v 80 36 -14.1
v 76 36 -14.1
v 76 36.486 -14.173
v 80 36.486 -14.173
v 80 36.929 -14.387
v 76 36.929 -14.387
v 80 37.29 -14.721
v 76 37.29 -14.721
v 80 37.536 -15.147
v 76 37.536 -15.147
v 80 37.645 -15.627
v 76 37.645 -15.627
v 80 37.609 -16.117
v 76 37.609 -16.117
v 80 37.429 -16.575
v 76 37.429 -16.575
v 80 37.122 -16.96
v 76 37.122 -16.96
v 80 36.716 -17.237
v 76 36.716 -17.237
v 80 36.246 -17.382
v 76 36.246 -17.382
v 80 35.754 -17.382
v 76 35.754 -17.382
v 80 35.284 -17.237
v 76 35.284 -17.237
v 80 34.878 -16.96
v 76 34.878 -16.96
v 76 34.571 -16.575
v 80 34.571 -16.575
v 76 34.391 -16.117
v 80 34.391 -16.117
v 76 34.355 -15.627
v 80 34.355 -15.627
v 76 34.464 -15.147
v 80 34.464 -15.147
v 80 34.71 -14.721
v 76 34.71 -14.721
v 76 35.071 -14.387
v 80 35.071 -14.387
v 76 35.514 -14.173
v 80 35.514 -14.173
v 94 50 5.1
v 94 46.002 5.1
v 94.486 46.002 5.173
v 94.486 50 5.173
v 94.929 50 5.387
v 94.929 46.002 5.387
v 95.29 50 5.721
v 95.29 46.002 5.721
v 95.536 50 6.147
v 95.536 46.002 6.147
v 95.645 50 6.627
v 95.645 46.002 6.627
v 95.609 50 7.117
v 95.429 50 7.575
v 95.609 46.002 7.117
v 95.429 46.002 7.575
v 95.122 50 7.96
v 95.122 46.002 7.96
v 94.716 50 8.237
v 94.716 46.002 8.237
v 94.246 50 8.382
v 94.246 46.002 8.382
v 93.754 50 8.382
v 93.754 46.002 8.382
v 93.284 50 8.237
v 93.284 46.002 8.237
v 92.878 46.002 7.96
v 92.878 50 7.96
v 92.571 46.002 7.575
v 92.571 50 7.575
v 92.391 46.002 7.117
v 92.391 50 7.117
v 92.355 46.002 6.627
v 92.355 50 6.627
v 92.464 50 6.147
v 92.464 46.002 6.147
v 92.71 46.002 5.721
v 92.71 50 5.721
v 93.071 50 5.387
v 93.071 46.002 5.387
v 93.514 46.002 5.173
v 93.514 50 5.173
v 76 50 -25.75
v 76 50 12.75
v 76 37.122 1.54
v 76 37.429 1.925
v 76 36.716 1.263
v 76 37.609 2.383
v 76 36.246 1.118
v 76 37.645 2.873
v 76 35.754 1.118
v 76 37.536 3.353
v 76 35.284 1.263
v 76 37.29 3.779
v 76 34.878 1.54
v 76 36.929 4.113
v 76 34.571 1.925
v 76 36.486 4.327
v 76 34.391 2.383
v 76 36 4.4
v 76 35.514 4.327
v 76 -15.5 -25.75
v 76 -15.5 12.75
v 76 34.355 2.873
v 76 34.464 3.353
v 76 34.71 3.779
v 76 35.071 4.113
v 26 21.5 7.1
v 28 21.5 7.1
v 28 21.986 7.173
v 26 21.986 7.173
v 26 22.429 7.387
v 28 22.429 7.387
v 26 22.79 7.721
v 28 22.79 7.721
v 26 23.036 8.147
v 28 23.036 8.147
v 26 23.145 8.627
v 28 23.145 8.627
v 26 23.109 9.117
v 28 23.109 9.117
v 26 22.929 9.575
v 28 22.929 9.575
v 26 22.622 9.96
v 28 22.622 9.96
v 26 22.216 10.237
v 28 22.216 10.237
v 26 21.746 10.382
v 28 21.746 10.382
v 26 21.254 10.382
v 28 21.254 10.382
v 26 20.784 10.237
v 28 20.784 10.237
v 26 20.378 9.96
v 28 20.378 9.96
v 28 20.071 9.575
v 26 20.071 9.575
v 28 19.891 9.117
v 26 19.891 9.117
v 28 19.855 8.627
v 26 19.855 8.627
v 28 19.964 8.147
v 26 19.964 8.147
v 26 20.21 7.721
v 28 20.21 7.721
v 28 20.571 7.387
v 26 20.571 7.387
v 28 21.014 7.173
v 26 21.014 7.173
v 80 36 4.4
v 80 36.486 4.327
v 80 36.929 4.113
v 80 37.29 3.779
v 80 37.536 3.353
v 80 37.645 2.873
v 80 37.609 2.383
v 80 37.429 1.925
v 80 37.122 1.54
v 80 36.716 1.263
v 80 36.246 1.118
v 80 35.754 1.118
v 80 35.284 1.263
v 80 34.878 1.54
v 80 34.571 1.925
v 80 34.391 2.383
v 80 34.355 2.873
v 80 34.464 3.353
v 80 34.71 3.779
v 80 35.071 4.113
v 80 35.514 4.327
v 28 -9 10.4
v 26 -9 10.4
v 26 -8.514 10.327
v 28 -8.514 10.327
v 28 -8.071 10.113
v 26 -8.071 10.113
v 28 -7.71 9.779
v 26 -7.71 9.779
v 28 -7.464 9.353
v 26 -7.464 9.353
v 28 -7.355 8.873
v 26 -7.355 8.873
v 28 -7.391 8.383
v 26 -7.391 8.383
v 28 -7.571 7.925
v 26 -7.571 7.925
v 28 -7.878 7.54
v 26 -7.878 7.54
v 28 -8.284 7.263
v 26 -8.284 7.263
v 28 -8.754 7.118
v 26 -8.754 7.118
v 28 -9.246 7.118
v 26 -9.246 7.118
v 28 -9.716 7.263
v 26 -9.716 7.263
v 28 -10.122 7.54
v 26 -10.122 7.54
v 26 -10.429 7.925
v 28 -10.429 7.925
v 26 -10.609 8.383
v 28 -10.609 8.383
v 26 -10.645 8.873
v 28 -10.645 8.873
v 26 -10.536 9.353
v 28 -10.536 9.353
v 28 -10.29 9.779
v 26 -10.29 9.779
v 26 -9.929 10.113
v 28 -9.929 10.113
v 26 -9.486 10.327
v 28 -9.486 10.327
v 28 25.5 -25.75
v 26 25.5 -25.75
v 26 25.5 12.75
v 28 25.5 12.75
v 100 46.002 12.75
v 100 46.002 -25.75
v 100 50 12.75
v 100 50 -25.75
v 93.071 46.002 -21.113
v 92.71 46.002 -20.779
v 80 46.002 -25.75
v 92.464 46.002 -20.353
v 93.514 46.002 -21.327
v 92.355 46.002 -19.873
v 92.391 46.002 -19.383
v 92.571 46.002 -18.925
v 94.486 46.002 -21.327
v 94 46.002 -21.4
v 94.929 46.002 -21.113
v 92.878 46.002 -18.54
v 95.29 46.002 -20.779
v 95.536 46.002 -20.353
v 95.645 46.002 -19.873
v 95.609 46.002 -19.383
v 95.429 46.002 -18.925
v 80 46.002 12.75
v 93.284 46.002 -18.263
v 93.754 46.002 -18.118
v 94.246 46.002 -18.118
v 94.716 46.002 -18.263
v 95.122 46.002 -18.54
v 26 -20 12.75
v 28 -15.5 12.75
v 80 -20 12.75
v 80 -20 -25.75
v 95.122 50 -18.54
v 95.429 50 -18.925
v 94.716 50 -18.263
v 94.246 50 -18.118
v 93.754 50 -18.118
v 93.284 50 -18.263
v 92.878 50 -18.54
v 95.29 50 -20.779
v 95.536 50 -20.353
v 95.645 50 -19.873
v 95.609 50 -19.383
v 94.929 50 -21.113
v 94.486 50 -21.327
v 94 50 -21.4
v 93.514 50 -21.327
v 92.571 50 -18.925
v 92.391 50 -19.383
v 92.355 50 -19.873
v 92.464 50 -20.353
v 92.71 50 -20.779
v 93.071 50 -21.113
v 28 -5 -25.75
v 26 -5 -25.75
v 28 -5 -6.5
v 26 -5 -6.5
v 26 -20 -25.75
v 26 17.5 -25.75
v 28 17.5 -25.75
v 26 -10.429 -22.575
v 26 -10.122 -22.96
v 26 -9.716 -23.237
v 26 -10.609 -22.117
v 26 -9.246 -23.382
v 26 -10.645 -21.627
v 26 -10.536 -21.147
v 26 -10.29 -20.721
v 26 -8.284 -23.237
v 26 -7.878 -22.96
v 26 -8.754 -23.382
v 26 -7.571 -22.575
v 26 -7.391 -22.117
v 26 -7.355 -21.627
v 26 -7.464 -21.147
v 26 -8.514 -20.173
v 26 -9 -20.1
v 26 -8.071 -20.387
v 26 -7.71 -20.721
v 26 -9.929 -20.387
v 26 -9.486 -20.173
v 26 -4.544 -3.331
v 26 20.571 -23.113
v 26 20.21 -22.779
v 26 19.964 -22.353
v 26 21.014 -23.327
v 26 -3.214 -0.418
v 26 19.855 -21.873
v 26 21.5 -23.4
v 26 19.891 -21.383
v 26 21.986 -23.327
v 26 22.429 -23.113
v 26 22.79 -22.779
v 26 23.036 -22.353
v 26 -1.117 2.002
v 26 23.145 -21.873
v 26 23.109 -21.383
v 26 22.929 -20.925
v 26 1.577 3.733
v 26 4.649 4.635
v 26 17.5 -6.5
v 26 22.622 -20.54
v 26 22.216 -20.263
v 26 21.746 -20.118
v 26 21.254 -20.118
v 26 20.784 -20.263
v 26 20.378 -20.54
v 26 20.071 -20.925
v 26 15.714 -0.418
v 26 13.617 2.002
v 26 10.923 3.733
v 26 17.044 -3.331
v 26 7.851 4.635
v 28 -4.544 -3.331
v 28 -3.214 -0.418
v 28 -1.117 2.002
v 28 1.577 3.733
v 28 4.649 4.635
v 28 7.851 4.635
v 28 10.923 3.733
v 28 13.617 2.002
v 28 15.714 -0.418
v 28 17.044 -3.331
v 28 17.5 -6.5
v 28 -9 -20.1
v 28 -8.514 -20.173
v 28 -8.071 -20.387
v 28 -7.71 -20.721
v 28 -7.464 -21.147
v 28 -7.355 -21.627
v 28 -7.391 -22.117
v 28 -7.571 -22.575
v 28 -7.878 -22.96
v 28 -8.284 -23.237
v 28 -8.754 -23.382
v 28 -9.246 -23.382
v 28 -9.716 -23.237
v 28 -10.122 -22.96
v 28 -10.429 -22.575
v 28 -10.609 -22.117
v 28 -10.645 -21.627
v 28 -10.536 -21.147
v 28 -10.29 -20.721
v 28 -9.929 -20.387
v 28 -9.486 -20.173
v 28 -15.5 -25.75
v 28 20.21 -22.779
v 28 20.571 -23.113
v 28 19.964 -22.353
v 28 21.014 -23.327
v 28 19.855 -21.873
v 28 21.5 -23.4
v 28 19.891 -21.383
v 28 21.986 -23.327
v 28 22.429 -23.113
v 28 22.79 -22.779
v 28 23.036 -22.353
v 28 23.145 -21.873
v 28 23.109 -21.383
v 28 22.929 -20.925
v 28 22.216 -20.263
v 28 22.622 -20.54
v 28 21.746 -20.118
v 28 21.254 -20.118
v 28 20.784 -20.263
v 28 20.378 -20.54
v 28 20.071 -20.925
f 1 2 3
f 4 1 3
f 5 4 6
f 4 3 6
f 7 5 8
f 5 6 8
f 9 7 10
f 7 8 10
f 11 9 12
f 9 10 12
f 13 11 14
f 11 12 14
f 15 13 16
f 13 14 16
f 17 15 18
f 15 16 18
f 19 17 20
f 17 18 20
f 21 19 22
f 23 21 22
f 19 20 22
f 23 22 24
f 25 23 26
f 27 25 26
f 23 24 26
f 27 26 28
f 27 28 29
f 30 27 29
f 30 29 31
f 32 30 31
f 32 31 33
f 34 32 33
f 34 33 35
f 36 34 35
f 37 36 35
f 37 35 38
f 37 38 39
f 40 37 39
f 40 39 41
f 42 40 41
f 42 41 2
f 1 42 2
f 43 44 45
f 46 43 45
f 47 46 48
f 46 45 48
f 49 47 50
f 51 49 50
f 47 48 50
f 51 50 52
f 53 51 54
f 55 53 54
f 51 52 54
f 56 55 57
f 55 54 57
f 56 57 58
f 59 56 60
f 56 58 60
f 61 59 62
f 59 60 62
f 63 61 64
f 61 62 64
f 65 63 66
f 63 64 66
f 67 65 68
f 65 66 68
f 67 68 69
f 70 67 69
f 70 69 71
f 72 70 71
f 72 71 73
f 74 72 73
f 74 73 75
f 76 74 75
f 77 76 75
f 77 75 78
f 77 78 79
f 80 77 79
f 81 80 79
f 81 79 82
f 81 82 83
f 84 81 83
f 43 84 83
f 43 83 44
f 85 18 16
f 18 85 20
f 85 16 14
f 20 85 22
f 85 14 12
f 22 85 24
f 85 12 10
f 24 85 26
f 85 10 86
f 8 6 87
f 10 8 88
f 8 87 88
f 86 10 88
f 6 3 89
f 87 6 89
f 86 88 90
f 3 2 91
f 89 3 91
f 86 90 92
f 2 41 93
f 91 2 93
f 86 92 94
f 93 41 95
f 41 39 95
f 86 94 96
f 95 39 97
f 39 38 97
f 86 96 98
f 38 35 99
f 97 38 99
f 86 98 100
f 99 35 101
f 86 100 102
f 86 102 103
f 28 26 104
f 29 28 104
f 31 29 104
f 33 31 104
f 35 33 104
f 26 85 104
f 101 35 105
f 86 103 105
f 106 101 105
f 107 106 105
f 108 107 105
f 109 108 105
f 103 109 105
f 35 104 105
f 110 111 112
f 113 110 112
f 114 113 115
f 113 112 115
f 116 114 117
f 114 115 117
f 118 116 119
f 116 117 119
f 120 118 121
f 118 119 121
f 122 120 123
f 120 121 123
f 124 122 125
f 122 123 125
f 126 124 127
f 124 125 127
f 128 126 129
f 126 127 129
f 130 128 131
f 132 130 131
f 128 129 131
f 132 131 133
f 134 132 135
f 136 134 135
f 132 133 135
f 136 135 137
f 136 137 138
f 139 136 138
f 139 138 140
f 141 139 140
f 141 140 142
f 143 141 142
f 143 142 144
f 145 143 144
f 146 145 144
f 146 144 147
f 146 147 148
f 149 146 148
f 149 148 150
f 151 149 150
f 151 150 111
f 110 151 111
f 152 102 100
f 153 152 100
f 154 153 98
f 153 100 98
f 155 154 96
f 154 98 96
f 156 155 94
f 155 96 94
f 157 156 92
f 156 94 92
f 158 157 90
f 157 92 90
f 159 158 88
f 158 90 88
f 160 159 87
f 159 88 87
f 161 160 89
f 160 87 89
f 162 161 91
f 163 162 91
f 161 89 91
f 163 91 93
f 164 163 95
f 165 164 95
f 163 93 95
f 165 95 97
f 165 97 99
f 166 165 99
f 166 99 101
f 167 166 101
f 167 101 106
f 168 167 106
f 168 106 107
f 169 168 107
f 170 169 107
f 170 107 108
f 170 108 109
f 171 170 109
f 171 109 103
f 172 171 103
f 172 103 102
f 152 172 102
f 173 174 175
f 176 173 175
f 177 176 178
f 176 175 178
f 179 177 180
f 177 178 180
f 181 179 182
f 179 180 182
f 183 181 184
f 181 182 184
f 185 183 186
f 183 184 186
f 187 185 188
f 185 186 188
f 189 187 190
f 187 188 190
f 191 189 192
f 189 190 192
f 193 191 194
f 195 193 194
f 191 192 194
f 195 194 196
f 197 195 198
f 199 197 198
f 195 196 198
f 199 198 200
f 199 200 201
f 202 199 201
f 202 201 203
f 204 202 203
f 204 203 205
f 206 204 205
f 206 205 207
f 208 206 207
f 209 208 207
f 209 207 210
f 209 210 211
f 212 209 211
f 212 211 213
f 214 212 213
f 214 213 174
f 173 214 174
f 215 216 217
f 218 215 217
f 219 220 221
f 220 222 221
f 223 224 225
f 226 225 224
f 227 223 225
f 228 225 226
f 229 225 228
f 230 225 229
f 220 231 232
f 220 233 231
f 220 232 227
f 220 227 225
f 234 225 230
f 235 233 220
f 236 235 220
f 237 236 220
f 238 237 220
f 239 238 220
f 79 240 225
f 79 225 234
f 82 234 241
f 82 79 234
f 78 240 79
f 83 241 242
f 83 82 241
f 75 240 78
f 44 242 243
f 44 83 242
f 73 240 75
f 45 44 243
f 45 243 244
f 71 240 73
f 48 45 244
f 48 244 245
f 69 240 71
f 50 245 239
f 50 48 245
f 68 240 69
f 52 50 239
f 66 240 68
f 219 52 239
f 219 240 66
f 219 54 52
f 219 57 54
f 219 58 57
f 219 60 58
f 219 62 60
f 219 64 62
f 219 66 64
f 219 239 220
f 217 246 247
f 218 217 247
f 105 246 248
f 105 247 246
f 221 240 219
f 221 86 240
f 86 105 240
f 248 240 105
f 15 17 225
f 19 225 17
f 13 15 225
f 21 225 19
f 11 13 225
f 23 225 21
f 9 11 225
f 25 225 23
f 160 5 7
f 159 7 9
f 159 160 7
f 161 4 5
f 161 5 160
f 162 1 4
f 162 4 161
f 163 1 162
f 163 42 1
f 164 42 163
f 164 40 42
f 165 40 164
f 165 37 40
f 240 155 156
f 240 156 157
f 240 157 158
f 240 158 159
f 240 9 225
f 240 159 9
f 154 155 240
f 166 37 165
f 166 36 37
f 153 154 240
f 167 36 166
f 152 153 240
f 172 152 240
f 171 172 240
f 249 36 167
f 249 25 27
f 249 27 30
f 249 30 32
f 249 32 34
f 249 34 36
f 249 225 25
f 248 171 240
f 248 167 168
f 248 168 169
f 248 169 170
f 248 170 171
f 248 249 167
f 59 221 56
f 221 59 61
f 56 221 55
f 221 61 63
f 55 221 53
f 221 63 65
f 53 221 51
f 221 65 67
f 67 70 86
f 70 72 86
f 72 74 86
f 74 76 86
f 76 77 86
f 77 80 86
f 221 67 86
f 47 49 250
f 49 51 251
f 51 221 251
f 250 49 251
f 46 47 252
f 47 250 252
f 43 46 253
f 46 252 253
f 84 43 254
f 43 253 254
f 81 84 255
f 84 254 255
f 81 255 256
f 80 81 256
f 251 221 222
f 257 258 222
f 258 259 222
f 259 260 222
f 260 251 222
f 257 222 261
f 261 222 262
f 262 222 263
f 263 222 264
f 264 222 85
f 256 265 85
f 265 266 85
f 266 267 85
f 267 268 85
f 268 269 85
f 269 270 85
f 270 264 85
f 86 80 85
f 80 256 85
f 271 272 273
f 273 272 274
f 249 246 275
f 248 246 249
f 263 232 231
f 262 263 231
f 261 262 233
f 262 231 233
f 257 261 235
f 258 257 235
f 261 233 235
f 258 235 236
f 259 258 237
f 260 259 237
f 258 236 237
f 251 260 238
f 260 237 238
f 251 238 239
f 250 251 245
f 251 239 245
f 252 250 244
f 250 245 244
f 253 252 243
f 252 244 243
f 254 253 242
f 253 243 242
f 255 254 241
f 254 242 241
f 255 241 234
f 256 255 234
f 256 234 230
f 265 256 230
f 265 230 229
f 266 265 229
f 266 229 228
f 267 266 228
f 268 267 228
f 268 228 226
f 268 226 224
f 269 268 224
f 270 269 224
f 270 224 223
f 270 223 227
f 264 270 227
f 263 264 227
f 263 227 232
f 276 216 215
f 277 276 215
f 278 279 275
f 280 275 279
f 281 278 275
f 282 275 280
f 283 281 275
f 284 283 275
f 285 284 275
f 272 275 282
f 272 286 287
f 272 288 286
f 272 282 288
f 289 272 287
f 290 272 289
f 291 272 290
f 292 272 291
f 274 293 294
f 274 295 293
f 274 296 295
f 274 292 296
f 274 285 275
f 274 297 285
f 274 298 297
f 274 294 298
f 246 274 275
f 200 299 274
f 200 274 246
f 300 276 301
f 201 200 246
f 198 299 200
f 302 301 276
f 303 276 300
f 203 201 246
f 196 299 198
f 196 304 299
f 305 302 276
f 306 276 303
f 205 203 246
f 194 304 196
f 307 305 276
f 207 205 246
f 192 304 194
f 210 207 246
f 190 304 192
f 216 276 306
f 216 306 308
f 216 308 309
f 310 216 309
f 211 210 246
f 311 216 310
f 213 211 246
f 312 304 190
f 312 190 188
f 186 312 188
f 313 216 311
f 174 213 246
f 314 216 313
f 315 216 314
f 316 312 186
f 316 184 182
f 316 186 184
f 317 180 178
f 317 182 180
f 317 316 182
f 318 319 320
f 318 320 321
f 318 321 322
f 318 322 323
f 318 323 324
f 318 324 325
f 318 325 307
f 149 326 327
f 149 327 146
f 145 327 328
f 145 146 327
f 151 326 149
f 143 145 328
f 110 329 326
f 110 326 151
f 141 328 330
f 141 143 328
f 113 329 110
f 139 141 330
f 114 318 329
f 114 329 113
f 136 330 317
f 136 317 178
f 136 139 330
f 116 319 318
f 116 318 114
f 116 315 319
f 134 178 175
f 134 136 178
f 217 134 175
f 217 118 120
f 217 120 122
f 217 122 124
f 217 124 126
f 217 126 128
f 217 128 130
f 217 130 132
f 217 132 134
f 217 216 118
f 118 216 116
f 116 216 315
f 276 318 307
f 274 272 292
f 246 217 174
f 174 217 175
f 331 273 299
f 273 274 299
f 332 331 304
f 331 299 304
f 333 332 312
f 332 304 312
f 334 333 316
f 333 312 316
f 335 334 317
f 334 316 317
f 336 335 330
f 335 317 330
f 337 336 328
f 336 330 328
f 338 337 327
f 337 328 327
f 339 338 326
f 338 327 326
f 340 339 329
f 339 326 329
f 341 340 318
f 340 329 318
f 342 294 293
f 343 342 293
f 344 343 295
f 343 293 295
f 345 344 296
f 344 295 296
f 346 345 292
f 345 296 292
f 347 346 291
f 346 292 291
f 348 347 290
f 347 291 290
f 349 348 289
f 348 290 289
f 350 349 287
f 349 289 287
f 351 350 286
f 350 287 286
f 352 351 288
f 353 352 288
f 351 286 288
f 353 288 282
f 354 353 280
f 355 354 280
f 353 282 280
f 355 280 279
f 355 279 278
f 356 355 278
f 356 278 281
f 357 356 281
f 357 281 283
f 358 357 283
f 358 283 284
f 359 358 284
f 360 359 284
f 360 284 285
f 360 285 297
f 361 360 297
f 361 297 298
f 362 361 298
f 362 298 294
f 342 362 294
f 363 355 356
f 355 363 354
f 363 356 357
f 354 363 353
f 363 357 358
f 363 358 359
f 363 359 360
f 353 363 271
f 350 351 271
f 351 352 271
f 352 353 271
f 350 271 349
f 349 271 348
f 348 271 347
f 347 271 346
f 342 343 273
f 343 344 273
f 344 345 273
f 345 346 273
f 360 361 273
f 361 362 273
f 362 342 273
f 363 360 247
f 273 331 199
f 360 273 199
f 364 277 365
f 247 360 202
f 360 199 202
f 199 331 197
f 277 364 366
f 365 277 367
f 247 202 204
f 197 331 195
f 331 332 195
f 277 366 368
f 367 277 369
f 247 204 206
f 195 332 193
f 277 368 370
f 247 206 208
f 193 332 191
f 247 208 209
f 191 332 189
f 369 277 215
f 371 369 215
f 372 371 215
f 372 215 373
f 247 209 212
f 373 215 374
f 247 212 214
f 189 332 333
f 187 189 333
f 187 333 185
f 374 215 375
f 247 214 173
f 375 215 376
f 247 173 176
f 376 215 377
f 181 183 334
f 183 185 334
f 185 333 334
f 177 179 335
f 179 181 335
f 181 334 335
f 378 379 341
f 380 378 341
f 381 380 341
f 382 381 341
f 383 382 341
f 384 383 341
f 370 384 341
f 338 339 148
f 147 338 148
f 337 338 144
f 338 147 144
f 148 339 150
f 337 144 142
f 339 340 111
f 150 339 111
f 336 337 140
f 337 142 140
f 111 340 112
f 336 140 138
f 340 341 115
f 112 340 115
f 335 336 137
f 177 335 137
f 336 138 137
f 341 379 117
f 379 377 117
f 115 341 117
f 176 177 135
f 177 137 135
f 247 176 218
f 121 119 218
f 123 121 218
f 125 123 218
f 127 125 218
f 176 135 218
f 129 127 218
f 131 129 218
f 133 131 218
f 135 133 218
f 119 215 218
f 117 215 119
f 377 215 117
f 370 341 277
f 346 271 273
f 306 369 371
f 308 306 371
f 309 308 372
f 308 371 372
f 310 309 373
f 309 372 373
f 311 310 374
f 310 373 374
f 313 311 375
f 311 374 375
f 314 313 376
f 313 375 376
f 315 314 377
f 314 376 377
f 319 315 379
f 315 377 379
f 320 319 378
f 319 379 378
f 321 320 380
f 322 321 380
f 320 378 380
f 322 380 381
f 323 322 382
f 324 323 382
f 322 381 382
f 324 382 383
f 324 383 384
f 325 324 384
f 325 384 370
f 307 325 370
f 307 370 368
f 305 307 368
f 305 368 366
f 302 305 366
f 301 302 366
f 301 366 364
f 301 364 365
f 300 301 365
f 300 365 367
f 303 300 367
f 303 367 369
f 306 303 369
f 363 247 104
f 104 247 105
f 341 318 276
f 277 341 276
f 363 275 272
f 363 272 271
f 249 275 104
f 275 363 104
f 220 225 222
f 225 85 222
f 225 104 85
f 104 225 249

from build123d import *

# Parameters (mm, degrees)
SKETCH1_W                 = 13
SKETCH1_H                 = 16
BOSS_EXTRUDE1_DEPTH       = 4
SKETCH2_R                 = 1.65
CUT_EXTRUDE1_DEPTH        = 10
SKETCH3_W                 = 4
SKETCH3_H                 = 13
BOSS_EXTRUDE2_DEPTH       = 4
SKETCH4_W                 = 13
SKETCH4_H                 = 4
BOSS_EXTRUDE3_DEPTH       = 60
SKETCH6_W                 = 4
SKETCH6_H                 = 21
SKETCH6_H_2               = 13
BOSS_EXTRUDE4_DEPTH       = 28
SKETCH12_W                = 4
SKETCH12_H                = 28
BOSS_EXTRUDE8_DEPTH       = 1.65
SKETCH13_W                = 4
SKETCH13_H                = 28
BOSS_EXTRUDE9_DEPTH       = 1.65
SKETCH14_W                = 4
SKETCH14_H                = 35.878399396
CUT_EXTRUDE5_DEPTH        = 24
SKETCH15_R                = 1.65
CUT_EXTRUDE6_DEPTH        = 24
SKETCH16_W                = 4
SKETCH16_H                = 11.121600604
SKETCH16_H_2              = 11.3
BOSS_EXTRUDE10_DEPTH      = 29.15
SKETCH17_R                = 1.65
CUT_EXTRUDE8_DEPTH        = 29.15
SKETCH18_W                = 22.65
SKETCH18_H                = 4
SKETCH18_W_2              = 13
BOSS_EXTRUDE11_DEPTH      = 4
SKETCH19_W                = 4
SKETCH19_H                = 20
BOSS_EXTRUDE12_DEPTH      = 40
SKETCH20_R                = 1.65
CUT_EXTRUDE9_DEPTH        = 40
SKETCH21_W                = 4
SKETCH21_H                = 30.5
BOSS_EXTRUDE13_DEPTH      = 38.5
SKETCH23_W                = 4
SKETCH23_H                = 4
BOSS_EXTRUDE14_DEPTH      = 38.5
SKETCH24_W                = 4
SKETCH24_H                = 38.5
BOSS_EXTRUDE15_DEPTH      = 3
SKETCH27_W                = 4
SKETCH27_H                = 58.3
CUT_EXTRUDE10_DEPTH       = 100
BOSS_EXTRUDE16_DEPTH      = 40
BOSS_EXTRUDE16_DEPTH_BACK = 28
SKETCH29_W                = 38.5
SKETCH29_H                = 7
SKETCH30_R                = 1.65
CUT_EXTRUDE11_DEPTH       = 40
SKETCH31_W                = 4
SKETCH31_H                = 22.5
CUT_EXTRUDE12_DEPTH       = 38.5
SKETCH32_W                = 38.5
SKETCH32_H                = 2.5
CUT_EXTRUDE13_DEPTH       = 40
SKETCH33_W                = 4
SKETCH33_H                = 8
BOSS_EXTRUDE17_DEPTH      = 8
SKETCH34_R                = 1.65
CUT_EXTRUDE14_DEPTH       = 8
SKETCH35_W                = 4
SKETCH35_H                = 43.5
BOSS_EXTRUDE18_DEPTH      = 13
CUT_EXTRUDE15_START       = -20
SKETCH36_W                = 10
SKETCH36_H                = 80
CUT_EXTRUDE15_DEPTH       = 20
SKETCH37_W                = 5
SKETCH37_H                = 7
BOSS_EXTRUDE19_DEPTH      = 4
SKETCH41_W                = 13
SKETCH41_H                = 20
BOSS_EXTRUDE20_DEPTH      = 4
SKETCH42_R                = 1.65
CUT_EXTRUDE18_DEPTH       = 4
SKETCH43_W                = 4
SKETCH43_H                = 38.5
CUT_EXTRUDE19_DEPTH       = 10
SKETCH44_W                = 8
SKETCH44_H                = 9
BOSS_EXTRUDE21_DEPTH      = 4
SKETCH45_R                = 1.65
CUT_EXTRUDE20_DEPTH       = 4
CUT_EXTRUDE21_DEPTH       = 3
SKETCH49_R                = 1.65
CUT_EXTRUDE22_DEPTH       = 5
SKETCH54_W                = 1
SKETCH54_H                = 38.5
CUT_EXTRUDE24_DEPTH       = 50
SKETCH55_W                = 8
SKETCH55_H                = 10
BOSS_EXTRUDE22_DEPTH      = 4
SKETCH56_R                = 1.65
CUT_EXTRUDE25_DEPTH       = 4
CUT_EXTRUDE26_DEPTH       = 15
CUT_EXTRUDE26_DEPTH_BACK  = 10
SKETCH57_W                = 25
SKETCH57_H                = 70
SKETCH58_W                = 47.5
SKETCH58_H                = 38.5
BOSS_EXTRUDE24_DEPTH      = 4.5
SKETCH59_W                = 0.5
SKETCH59_H                = 38.5
BOSS_EXTRUDE25_DEPTH      = 4.5
SKETCH60_W                = 4
SKETCH60_H                = 38.5
BOSS_EXTRUDE26_DEPTH      = 69.5
SKETCH61_W                = 38.5
SKETCH61_H                = 2.457662878
BOSS_EXTRUDE27_DEPTH      = 20
SKETCH62_W                = 38.5
SKETCH62_H                = 2
BOSS_EXTRUDE31_DEPTH      = 29.5
SKETCH64_W                = 4
SKETCH64_H                = 13
BOSS_EXTRUDE32_DEPTH      = 16
SKETCH65_R                = 1.65
CUT_EXTRUDE27_DEPTH       = 16
SKETCH66_W                = 24
SKETCH66_H                = 0.5
BOSS_EXTRUDE33_DEPTH      = 38.5
SKETCH69_W                = 20
SKETCH69_H                = 38.5
BOSS_EXTRUDE34_DEPTH      = 1.04
SKETCH70_R                = 1.65
CUT_EXTRUDE29_DEPTH       = 10
SKETCH72_W                = 2
SKETCH72_H                = 38.5
CUT_EXTRUDE31_DEPTH       = 60
SKETCH73_W                = 22.5
SKETCH73_H                = 38.5
BOSS_EXTRUDE35_DEPTH      = 2
SKETCH74_R                = 11.25
CUT_EXTRUDE32_DEPTH       = 2
CUT_EXTRUDE33_DEPTH       = 2
SKETCH76_R                = 1.65
CUT_EXTRUDE34_DEPTH       = 5
SKETCH77_W                = 35
SKETCH77_H                = 30
CUT_EXTRUDE35_DEPTH       = 1000


with BuildPart() as part:
    # Sketch1 → Boss-Extrude1 (new body)
    with BuildSketch(Plane(origin=(0, 0, 0), x_dir=(0, 0, -1), z_dir=(1, 0, 0))):
        with Locations((6.5, -8)):
            Rectangle(SKETCH1_W, SKETCH1_H)
    extrude(amount=BOSS_EXTRUDE1_DEPTH)

    # Sketch2 → Cut-Extrude1 (cut)
    with BuildSketch(Plane(origin=(4, 0, 0), x_dir=(0, 0, -1), z_dir=(1, 0, 0))):
        with Locations((6.5, -4)):
            Circle(SKETCH2_R)
        with Locations((6.5, -12)):
            Circle(SKETCH2_R)
    extrude(amount=-CUT_EXTRUDE1_DEPTH, mode=Mode.SUBTRACT)

    # Sketch3 → Boss-Extrude2 (add)
    with BuildSketch(Plane.XZ.offset(16)):
        with Locations((2, -6.5)):
            Rectangle(SKETCH3_W, SKETCH3_H)
    extrude(amount=BOSS_EXTRUDE2_DEPTH)

    # Sketch4 → Boss-Extrude3 (add)
    with BuildSketch(Plane(origin=(4, 0, 0), x_dir=(0, 0, -1), z_dir=(1, 0, 0))):
        with Locations((6.5, -18)):
            Rectangle(SKETCH4_W, SKETCH4_H)
    extrude(amount=BOSS_EXTRUDE3_DEPTH)

    # Sketch6 → Boss-Extrude4 (add)
    with BuildSketch(Plane(origin=(0, -16, 0), x_dir=(1, 0, 0), z_dir=(0, 1, 0))):
        with Locations((62, -10.5)):
            Rectangle(SKETCH6_W, SKETCH6_H)
        with Locations((62, 23.5)):
            Rectangle(SKETCH6_W, SKETCH6_H)
        with Locations((62, 6.5)):
            Rectangle(SKETCH6_W, SKETCH6_H_2)
    extrude(amount=BOSS_EXTRUDE4_DEPTH)

    # Sketch12 → Boss-Extrude8 (add)
    with BuildSketch(Plane(origin=(0, 0, -34), x_dir=(-1, 0, 0), z_dir=(0, 0, -1))):
        with Locations((-62, -2)):
            Rectangle(SKETCH12_W, SKETCH12_H)
    extrude(amount=BOSS_EXTRUDE8_DEPTH)

    # Sketch13 → Boss-Extrude9 (add)
    with BuildSketch(Plane.XY.offset(21)):
        with Locations((62, -2)):
            Rectangle(SKETCH13_W, SKETCH13_H)
    extrude(amount=BOSS_EXTRUDE9_DEPTH)

    # Sketch14 → Cut-Extrude5 (cut)
    with BuildSketch(Plane(origin=(0, 12, 0), x_dir=(1, 0, 0), z_dir=(0, 1, 0))):
        with Locations((62, 6.410800302)):
            Rectangle(SKETCH14_W, SKETCH14_H)
    extrude(amount=-CUT_EXTRUDE5_DEPTH, mode=Mode.SUBTRACT)

    # Sketch15 → Cut-Extrude6 (cut)
    with BuildSketch(Plane(origin=(64, 0, 0), x_dir=(0, 0, -1), z_dir=(1, 0, 0))):
        with Locations((-17, -11.5)):
            Circle(SKETCH15_R)
        with Locations((30, -11.5)):
            Circle(SKETCH15_R)
    extrude(amount=-CUT_EXTRUDE6_DEPTH, mode=Mode.SUBTRACT)

    # Sketch16 → Boss-Extrude10 (add)
    with BuildSketch(Plane(origin=(0, 12, 0), x_dir=(1, 0, 0), z_dir=(0, 1, 0))):
        with Locations((62, -17.089199698)):
            Rectangle(SKETCH16_W, SKETCH16_H)
        with Locations((62, 30)):
            Rectangle(SKETCH16_W, SKETCH16_H_2)
    extrude(amount=BOSS_EXTRUDE10_DEPTH)

    # Sketch17 → Cut-Extrude8 (cut)
    with BuildSketch(Plane(origin=(64, 0, 0), x_dir=(0, 0, -1), z_dir=(1, 0, 0))):
        with Locations((-17, 35.5)):
            Circle(SKETCH17_R)
        with Locations((30, 35.5)):
            Circle(SKETCH17_R)
    extrude(amount=-CUT_EXTRUDE8_DEPTH, mode=Mode.SUBTRACT)

    # Sketch18 → Boss-Extrude11 (add)
    with BuildSketch(Plane(origin=(64, 0, 0), x_dir=(0, 0, -1), z_dir=(1, 0, 0))):
        with Locations((-11.325, -18)):
            Rectangle(SKETCH18_W, SKETCH18_H)
        with Locations((24.325, -18)):
            Rectangle(SKETCH18_W, SKETCH18_H)
        with Locations((6.5, -18)):
            Rectangle(SKETCH18_W_2, SKETCH18_H)
    extrude(amount=-BOSS_EXTRUDE11_DEPTH)

    # Sketch19 → Boss-Extrude12 (add)
    with BuildSketch(Plane(origin=(0, 0, -13), x_dir=(-1, 0, 0), z_dir=(0, 0, -1))):
        with Locations((-2, -10)):
            Rectangle(SKETCH19_W, SKETCH19_H)
    extrude(amount=BOSS_EXTRUDE12_DEPTH)

    # Sketch20 → Cut-Extrude9 (cut)
    with BuildSketch(Plane.ZY):
        with Locations((-46.5, -4)):
            Circle(SKETCH20_R)
        with Locations((-46.5, -12)):
            Circle(SKETCH20_R)
    extrude(amount=-CUT_EXTRUDE9_DEPTH, mode=Mode.SUBTRACT)

    # Sketch21 → Boss-Extrude13 (add)
    with BuildSketch(Plane(origin=(0, -16, 0), x_dir=(1, 0, 0), z_dir=(0, 1, 0))):
        with Locations((26, 6.5)):
            Rectangle(SKETCH21_W, SKETCH21_H)
    extrude(amount=BOSS_EXTRUDE13_DEPTH)

    # Sketch23 → Boss-Extrude14 (add)
    with BuildSketch(Plane(origin=(0, 22.5, 0), x_dir=(1, 0, 0), z_dir=(0, 1, 0))):
        with Locations((26, 23.75)):
            Rectangle(SKETCH23_W, SKETCH23_H)
        with Locations((26, -10.75)):
            Rectangle(SKETCH23_W, SKETCH23_H)
    extrude(amount=-BOSS_EXTRUDE14_DEPTH)

    # Sketch24 → Boss-Extrude15 (add)
    with BuildSketch(Plane(origin=(0, 22.5, 0), x_dir=(1, 0, 0), z_dir=(0, 1, 0))):
        with Locations((26, 6.5)):
            Rectangle(SKETCH24_W, SKETCH24_H)
    extrude(amount=BOSS_EXTRUDE15_DEPTH)

    # Sketch27 → Cut-Extrude10 (cut)
    with BuildSketch(Plane.XZ.offset(20)):
        with Locations((62, -6.5)):
            Rectangle(SKETCH27_W, SKETCH27_H)
    extrude(amount=-CUT_EXTRUDE10_DEPTH, mode=Mode.SUBTRACT)

    # Sketch29 → Boss-Extrude16 (add, two sides: drawn at the far end of the back side and taken through both)
    with BuildSketch(Plane(origin=(28, 0, 0), x_dir=(0, 0, -1), z_dir=(1, 0, 0)).offset(-BOSS_EXTRUDE16_DEPTH_BACK)):
        with Locations((6.5, -16.5)):
            Rectangle(SKETCH29_W, SKETCH29_H)
    extrude(amount=BOSS_EXTRUDE16_DEPTH + BOSS_EXTRUDE16_DEPTH_BACK)

    # Sketch30 → Cut-Extrude11 (cut)
    with BuildSketch(Plane.ZY.offset(-24)):
        with Locations((8.75, 21.5)):
            Circle(SKETCH30_R)
        with Locations((8.75, -9)):
            Circle(SKETCH30_R)
        with Locations((-21.75, 21.5)):
            Circle(SKETCH30_R)
        with Locations((-21.75, -9)):
            Circle(SKETCH30_R)
    extrude(amount=-CUT_EXTRUDE11_DEPTH, mode=Mode.SUBTRACT)

    # Sketch31 → Cut-Extrude12 (cut)
    with BuildSketch(Plane(origin=(0, 25.5, 0), x_dir=(1, 0, 0), z_dir=(0, 1, 0))):
        with Locations((26, 6.5)):
            Rectangle(SKETCH31_W, SKETCH31_H)
    extrude(amount=-CUT_EXTRUDE12_DEPTH, mode=Mode.SUBTRACT)

    # Sketch32 → Cut-Extrude13 (cut)
    with BuildSketch(Plane(origin=(68, 0, 0), x_dir=(0, 0, -1), z_dir=(1, 0, 0))):
        with Locations((6.5, -14.25)):
            Rectangle(SKETCH32_W, SKETCH32_H)
    extrude(amount=-CUT_EXTRUDE13_DEPTH, mode=Mode.SUBTRACT)

    # Sketch33 → Boss-Extrude17 (add)
    with BuildSketch(Plane(origin=(0, 25.5, 0), x_dir=(1, 0, 0), z_dir=(0, 1, 0))):
        with Locations((26, -8.75)):
            Rectangle(SKETCH33_W, SKETCH33_H)
        with Locations((26, 21.75)):
            Rectangle(SKETCH33_W, SKETCH33_H)
    extrude(amount=-BOSS_EXTRUDE17_DEPTH)

    # Sketch34 → Cut-Extrude14 (cut)
    with BuildSketch(Plane(origin=(28, 0, 0), x_dir=(0, 0, -1), z_dir=(1, 0, 0))):
        with Locations((-8.75, 21.5)):
            Circle(SKETCH34_R)
        with Locations((21.75, 21.5)):
            Circle(SKETCH34_R)
    extrude(amount=-CUT_EXTRUDE14_DEPTH, mode=Mode.SUBTRACT)

    # Sketch35 → Boss-Extrude18 (add)
    with BuildSketch(Plane(origin=(0, -13, 0), x_dir=(1, 0, 0), z_dir=(0, 1, 0))):
        with Locations((12, 9)):
            Rectangle(SKETCH35_W, SKETCH35_H)
    extrude(amount=BOSS_EXTRUDE18_DEPTH)

    # Sketch36 → Cut-Extrude15 (cut)
    with BuildSketch(Plane.XZ.offset(20).offset(CUT_EXTRUDE15_START)):
        with Locations((5, -27.25)):
            Rectangle(SKETCH36_W, SKETCH36_H)
    extrude(amount=CUT_EXTRUDE15_DEPTH, mode=Mode.SUBTRACT)

    # Sketch37 → Boss-Extrude19 (add)
    with BuildSketch(Plane.ZY.offset(-10)):
        with Locations((-28.25, -16.5)):
            Rectangle(SKETCH37_W, SKETCH37_H)
    extrude(amount=-BOSS_EXTRUDE19_DEPTH)

    # Sketch41 → Boss-Extrude20 (add)
    with BuildSketch(Plane(origin=(14, 0, 0), x_dir=(0, 0, -1), z_dir=(1, 0, 0))):
        with Locations((32.25, -10)):
            Rectangle(SKETCH41_W, SKETCH41_H)
    extrude(amount=-BOSS_EXTRUDE20_DEPTH)

    # Sketch42 → Cut-Extrude18 (cut)
    with BuildSketch(Plane.ZY.offset(-10)):
        with Locations((-32.25, -4)):
            Circle(SKETCH42_R)
        with Locations((-32.25, -12)):
            Circle(SKETCH42_R)
    extrude(amount=-CUT_EXTRUDE18_DEPTH, mode=Mode.SUBTRACT)

    # Sketch43 → Cut-Extrude19 (cut)
    with BuildSketch(Plane(origin=(0, 0, 0), x_dir=(1, 0, 0), z_dir=(0, 1, 0))):
        with Locations((12, 6.5)):
            Rectangle(SKETCH43_W, SKETCH43_H)
    extrude(amount=-CUT_EXTRUDE19_DEPTH, mode=Mode.SUBTRACT)

    # Sketch44 → Boss-Extrude21 (add)
    with BuildSketch(Plane(origin=(28, 0, 0), x_dir=(0, 0, -1), z_dir=(1, 0, 0))):
        with Locations((-8.75, -11)):
            Rectangle(SKETCH44_W, SKETCH44_H)
        with Locations((21.75, -11)):
            Rectangle(SKETCH44_W, SKETCH44_H)
    extrude(amount=-BOSS_EXTRUDE21_DEPTH)

    # Sketch45 → Cut-Extrude20 (cut)
    with BuildSketch(Plane.ZY.offset(-24)):
        with Locations((-21.75, -7)):
            Circle(SKETCH45_R)
        with Locations((8.75, -7)):
            Circle(SKETCH45_R)
    extrude(amount=-CUT_EXTRUDE20_DEPTH, mode=Mode.SUBTRACT)

    # Sketch46 → Cut-Extrude21 (cut)
    with BuildSketch(Plane(origin=(0, -15.5, 0), x_dir=(1, 0, 0), z_dir=(0, 1, 0))):
        Polygon((64, 18.285898385), (67, 20.017949192), (67, 23.482050808), (64, 25.214101615), (61, 23.482050808), (61, 20.017949192), align=None)
        Polygon((64, -12.214101615), (67, -10.482050808), (67, -7.017949192), (64, -5.285898385), (61, -7.017949192), (61, -10.482050808), align=None)
    extrude(amount=-CUT_EXTRUDE21_DEPTH, mode=Mode.SUBTRACT)

    # Sketch49 → Cut-Extrude22 (cut)
    with BuildSketch(Plane(origin=(0, -15.5, 0), x_dir=(1, 0, 0), z_dir=(0, 1, 0))):
        with Locations(Location((64, 21.75, 0), (0, 0, 270))):
            Circle(SKETCH49_R)
        with Locations(Location((64, -8.75, 0), (0, 0, 270))):
            Circle(SKETCH49_R)
    extrude(amount=-CUT_EXTRUDE22_DEPTH, mode=Mode.SUBTRACT)

    # Sketch54 → Cut-Extrude24 (cut)
    with BuildSketch(Plane(origin=(0, -10, 0), x_dir=(1, 0, 0), z_dir=(0, 1, 0))):
        with Locations((10.5, 6.5)):
            Rectangle(SKETCH54_W, SKETCH54_H)
    extrude(amount=-CUT_EXTRUDE24_DEPTH, mode=Mode.SUBTRACT)

    # Sketch55 → Boss-Extrude22 (add)
    with BuildSketch(Plane.ZY.offset(-24)):
        with Locations((8.75, -8)):
            Rectangle(SKETCH55_W, SKETCH55_H)
        with Locations((-21.75, -8)):
            Rectangle(SKETCH55_W, SKETCH55_H)
    extrude(amount=-BOSS_EXTRUDE22_DEPTH)

    # Sketch56 → Cut-Extrude25 (cut)
    with BuildSketch(Plane.ZY.offset(-24)):
        with Locations((-21.75, -9)):
            Circle(SKETCH56_R)
        with Locations((8.75, -9)):
            Circle(SKETCH56_R)
    extrude(amount=-CUT_EXTRUDE25_DEPTH, mode=Mode.SUBTRACT)

    # Sketch57 → Cut-Extrude26 (cut, two sides: drawn at the far end of the back side and taken through both)
    with BuildSketch(Plane(origin=(0, -13, 0), x_dir=(1, 0, 0), z_dir=(0, 1, 0)).offset(-CUT_EXTRUDE26_DEPTH_BACK)):
        with Locations((11.5, 22.25)):
            Rectangle(SKETCH57_W, SKETCH57_H)
    extrude(amount=CUT_EXTRUDE26_DEPTH + CUT_EXTRUDE26_DEPTH_BACK, mode=Mode.SUBTRACT)

    # Sketch58 → Boss-Extrude24 (add)
    with BuildSketch(Plane.XZ.offset(20)):
        with Locations((51.75, -6.5)):
            Rectangle(SKETCH58_W, SKETCH58_H)
    extrude(amount=-BOSS_EXTRUDE24_DEPTH)

    # Sketch59 → Boss-Extrude25 (add)
    with BuildSketch(Plane.XZ.offset(20)):
        with Locations((75.75, -6.5)):
            Rectangle(SKETCH59_W, SKETCH59_H)
    extrude(amount=-BOSS_EXTRUDE25_DEPTH)

    # Sketch60 → Boss-Extrude26 (add)
    with BuildSketch(Plane.XZ.offset(20)):
        with Locations((78, -6.5)):
            Rectangle(SKETCH60_W, SKETCH60_H)
    extrude(amount=-BOSS_EXTRUDE26_DEPTH)

    # Sketch61 → Boss-Extrude27 (add)
    with BuildSketch(Plane(origin=(80, 0, 0), x_dir=(0, 0, -1), z_dir=(1, 0, 0))):
        with Locations((6.5, 48.271168561)):
            Rectangle(SKETCH61_W, SKETCH61_H)
    extrude(amount=BOSS_EXTRUDE27_DEPTH)

    # Sketch62 → Boss-Extrude31 (add)
    with BuildSketch(Plane.ZY.offset(-76)):
        with Locations((-6.5, 29)):
            Rectangle(SKETCH62_W, SKETCH62_H)
    extrude(amount=BOSS_EXTRUDE31_DEPTH)

    # Sketch64 → Boss-Extrude32 (add)
    with BuildSketch(Plane(origin=(0, 30, 0), x_dir=(1, 0, 0), z_dir=(0, 1, 0))):
        with Locations((48.5, 6.5)):
            Rectangle(SKETCH64_W, SKETCH64_H)
    extrude(amount=BOSS_EXTRUDE32_DEPTH)

    # Sketch65 → Cut-Extrude27 (cut)
    with BuildSketch(Plane.ZY.offset(-46.5)):
        with Locations((-6.5, 34)):
            Circle(SKETCH65_R)
        with Locations((-6.5, 42)):
            Circle(SKETCH65_R)
    extrude(amount=-CUT_EXTRUDE27_DEPTH, mode=Mode.SUBTRACT)

    # Sketch66 → Boss-Extrude33 (add)
    with BuildSketch(Plane(origin=(0, 0, -25.75), x_dir=(-1, 0, 0), z_dir=(0, 0, -1))):
        with Locations((-88, 49.75)):
            Rectangle(SKETCH66_W, SKETCH66_H)
    extrude(amount=-BOSS_EXTRUDE33_DEPTH)

    # Sketch69 → Boss-Extrude34 (add)
    with BuildSketch(Plane.XZ.offset(-47.042337122)):
        with Locations((90, -6.5)):
            Rectangle(SKETCH69_W, SKETCH69_H)
    extrude(amount=BOSS_EXTRUDE34_DEPTH)

    # Sketch70 → Cut-Extrude29 (cut)
    with BuildSketch(Plane.XZ.offset(-46.002337122)):
        with Locations(Location((94, 6.75, 0), (0, 0, 270))):
            Circle(SKETCH70_R)
        with Locations(Location((94, -19.75, 0), (0, 0, 270))):
            Circle(SKETCH70_R)
    extrude(amount=-CUT_EXTRUDE29_DEPTH, mode=Mode.SUBTRACT)

    # Sketch72 → Cut-Extrude31 (cut)
    with BuildSketch(Plane.XZ.offset(20)):
        with Locations((25, -6.5)):
            Rectangle(SKETCH72_W, SKETCH72_H)
    extrude(amount=-CUT_EXTRUDE31_DEPTH, mode=Mode.SUBTRACT)

    # Sketch73 → Boss-Extrude35 (add)
    with BuildSketch(Plane.ZY.offset(-26)):
        with Locations((-6.5, 6.25)):
            Rectangle(SKETCH73_W, SKETCH73_H)
    extrude(amount=-BOSS_EXTRUDE35_DEPTH)

    # Sketch74 → Cut-Extrude32 (cut)
    with BuildSketch(Plane.ZY.offset(-26)):
        with Locations((-6.5, 6.25)):
            Circle(SKETCH74_R)
    extrude(amount=-CUT_EXTRUDE32_DEPTH, mode=Mode.SUBTRACT)

    # Sketch75 → Cut-Extrude33 (cut)
    with BuildSketch(Plane.ZY.offset(-26)):
        with BuildLine():
            Line((-25.75, 6.25), (-17.75, 6.25))
            ThreePointArc((-17.75, 6.25), (-14.454951288, 14.204951288), (-6.5, 17.5))
            Line((-6.5, 17.5), (-25.75, 17.5))
            Line((-25.75, 17.5), (-25.75, 6.25))
        make_face()
        with BuildLine():
            ThreePointArc((-6.5, -5), (-14.454951288, -1.704951288), (-17.75, 6.25))
            Line((-17.75, 6.25), (-25.75, 6.25))
            Line((-25.75, 6.25), (-25.75, -5))
            Line((-25.75, -5), (-6.5, -5))
        make_face()
    extrude(amount=-CUT_EXTRUDE33_DEPTH, mode=Mode.SUBTRACT)

    # Sketch76 → Cut-Extrude34 (cut)
    with BuildSketch(Plane.ZY.offset(-76)):
        with Locations((2.75, 36)):
            Circle(SKETCH76_R)
        with Locations((-15.75, 36)):
            Circle(SKETCH76_R)
    extrude(amount=-CUT_EXTRUDE34_DEPTH, mode=Mode.SUBTRACT)

    # Sketch77 → Cut-Extrude35 (cut)
    with BuildSketch(Plane.XY.offset(12.75)):
        with Locations((58.5, 43)):
            Rectangle(SKETCH77_W, SKETCH77_H)
    extrude(amount=-CUT_EXTRUDE35_DEPTH, mode=Mode.SUBTRACT)


solid = part.part
